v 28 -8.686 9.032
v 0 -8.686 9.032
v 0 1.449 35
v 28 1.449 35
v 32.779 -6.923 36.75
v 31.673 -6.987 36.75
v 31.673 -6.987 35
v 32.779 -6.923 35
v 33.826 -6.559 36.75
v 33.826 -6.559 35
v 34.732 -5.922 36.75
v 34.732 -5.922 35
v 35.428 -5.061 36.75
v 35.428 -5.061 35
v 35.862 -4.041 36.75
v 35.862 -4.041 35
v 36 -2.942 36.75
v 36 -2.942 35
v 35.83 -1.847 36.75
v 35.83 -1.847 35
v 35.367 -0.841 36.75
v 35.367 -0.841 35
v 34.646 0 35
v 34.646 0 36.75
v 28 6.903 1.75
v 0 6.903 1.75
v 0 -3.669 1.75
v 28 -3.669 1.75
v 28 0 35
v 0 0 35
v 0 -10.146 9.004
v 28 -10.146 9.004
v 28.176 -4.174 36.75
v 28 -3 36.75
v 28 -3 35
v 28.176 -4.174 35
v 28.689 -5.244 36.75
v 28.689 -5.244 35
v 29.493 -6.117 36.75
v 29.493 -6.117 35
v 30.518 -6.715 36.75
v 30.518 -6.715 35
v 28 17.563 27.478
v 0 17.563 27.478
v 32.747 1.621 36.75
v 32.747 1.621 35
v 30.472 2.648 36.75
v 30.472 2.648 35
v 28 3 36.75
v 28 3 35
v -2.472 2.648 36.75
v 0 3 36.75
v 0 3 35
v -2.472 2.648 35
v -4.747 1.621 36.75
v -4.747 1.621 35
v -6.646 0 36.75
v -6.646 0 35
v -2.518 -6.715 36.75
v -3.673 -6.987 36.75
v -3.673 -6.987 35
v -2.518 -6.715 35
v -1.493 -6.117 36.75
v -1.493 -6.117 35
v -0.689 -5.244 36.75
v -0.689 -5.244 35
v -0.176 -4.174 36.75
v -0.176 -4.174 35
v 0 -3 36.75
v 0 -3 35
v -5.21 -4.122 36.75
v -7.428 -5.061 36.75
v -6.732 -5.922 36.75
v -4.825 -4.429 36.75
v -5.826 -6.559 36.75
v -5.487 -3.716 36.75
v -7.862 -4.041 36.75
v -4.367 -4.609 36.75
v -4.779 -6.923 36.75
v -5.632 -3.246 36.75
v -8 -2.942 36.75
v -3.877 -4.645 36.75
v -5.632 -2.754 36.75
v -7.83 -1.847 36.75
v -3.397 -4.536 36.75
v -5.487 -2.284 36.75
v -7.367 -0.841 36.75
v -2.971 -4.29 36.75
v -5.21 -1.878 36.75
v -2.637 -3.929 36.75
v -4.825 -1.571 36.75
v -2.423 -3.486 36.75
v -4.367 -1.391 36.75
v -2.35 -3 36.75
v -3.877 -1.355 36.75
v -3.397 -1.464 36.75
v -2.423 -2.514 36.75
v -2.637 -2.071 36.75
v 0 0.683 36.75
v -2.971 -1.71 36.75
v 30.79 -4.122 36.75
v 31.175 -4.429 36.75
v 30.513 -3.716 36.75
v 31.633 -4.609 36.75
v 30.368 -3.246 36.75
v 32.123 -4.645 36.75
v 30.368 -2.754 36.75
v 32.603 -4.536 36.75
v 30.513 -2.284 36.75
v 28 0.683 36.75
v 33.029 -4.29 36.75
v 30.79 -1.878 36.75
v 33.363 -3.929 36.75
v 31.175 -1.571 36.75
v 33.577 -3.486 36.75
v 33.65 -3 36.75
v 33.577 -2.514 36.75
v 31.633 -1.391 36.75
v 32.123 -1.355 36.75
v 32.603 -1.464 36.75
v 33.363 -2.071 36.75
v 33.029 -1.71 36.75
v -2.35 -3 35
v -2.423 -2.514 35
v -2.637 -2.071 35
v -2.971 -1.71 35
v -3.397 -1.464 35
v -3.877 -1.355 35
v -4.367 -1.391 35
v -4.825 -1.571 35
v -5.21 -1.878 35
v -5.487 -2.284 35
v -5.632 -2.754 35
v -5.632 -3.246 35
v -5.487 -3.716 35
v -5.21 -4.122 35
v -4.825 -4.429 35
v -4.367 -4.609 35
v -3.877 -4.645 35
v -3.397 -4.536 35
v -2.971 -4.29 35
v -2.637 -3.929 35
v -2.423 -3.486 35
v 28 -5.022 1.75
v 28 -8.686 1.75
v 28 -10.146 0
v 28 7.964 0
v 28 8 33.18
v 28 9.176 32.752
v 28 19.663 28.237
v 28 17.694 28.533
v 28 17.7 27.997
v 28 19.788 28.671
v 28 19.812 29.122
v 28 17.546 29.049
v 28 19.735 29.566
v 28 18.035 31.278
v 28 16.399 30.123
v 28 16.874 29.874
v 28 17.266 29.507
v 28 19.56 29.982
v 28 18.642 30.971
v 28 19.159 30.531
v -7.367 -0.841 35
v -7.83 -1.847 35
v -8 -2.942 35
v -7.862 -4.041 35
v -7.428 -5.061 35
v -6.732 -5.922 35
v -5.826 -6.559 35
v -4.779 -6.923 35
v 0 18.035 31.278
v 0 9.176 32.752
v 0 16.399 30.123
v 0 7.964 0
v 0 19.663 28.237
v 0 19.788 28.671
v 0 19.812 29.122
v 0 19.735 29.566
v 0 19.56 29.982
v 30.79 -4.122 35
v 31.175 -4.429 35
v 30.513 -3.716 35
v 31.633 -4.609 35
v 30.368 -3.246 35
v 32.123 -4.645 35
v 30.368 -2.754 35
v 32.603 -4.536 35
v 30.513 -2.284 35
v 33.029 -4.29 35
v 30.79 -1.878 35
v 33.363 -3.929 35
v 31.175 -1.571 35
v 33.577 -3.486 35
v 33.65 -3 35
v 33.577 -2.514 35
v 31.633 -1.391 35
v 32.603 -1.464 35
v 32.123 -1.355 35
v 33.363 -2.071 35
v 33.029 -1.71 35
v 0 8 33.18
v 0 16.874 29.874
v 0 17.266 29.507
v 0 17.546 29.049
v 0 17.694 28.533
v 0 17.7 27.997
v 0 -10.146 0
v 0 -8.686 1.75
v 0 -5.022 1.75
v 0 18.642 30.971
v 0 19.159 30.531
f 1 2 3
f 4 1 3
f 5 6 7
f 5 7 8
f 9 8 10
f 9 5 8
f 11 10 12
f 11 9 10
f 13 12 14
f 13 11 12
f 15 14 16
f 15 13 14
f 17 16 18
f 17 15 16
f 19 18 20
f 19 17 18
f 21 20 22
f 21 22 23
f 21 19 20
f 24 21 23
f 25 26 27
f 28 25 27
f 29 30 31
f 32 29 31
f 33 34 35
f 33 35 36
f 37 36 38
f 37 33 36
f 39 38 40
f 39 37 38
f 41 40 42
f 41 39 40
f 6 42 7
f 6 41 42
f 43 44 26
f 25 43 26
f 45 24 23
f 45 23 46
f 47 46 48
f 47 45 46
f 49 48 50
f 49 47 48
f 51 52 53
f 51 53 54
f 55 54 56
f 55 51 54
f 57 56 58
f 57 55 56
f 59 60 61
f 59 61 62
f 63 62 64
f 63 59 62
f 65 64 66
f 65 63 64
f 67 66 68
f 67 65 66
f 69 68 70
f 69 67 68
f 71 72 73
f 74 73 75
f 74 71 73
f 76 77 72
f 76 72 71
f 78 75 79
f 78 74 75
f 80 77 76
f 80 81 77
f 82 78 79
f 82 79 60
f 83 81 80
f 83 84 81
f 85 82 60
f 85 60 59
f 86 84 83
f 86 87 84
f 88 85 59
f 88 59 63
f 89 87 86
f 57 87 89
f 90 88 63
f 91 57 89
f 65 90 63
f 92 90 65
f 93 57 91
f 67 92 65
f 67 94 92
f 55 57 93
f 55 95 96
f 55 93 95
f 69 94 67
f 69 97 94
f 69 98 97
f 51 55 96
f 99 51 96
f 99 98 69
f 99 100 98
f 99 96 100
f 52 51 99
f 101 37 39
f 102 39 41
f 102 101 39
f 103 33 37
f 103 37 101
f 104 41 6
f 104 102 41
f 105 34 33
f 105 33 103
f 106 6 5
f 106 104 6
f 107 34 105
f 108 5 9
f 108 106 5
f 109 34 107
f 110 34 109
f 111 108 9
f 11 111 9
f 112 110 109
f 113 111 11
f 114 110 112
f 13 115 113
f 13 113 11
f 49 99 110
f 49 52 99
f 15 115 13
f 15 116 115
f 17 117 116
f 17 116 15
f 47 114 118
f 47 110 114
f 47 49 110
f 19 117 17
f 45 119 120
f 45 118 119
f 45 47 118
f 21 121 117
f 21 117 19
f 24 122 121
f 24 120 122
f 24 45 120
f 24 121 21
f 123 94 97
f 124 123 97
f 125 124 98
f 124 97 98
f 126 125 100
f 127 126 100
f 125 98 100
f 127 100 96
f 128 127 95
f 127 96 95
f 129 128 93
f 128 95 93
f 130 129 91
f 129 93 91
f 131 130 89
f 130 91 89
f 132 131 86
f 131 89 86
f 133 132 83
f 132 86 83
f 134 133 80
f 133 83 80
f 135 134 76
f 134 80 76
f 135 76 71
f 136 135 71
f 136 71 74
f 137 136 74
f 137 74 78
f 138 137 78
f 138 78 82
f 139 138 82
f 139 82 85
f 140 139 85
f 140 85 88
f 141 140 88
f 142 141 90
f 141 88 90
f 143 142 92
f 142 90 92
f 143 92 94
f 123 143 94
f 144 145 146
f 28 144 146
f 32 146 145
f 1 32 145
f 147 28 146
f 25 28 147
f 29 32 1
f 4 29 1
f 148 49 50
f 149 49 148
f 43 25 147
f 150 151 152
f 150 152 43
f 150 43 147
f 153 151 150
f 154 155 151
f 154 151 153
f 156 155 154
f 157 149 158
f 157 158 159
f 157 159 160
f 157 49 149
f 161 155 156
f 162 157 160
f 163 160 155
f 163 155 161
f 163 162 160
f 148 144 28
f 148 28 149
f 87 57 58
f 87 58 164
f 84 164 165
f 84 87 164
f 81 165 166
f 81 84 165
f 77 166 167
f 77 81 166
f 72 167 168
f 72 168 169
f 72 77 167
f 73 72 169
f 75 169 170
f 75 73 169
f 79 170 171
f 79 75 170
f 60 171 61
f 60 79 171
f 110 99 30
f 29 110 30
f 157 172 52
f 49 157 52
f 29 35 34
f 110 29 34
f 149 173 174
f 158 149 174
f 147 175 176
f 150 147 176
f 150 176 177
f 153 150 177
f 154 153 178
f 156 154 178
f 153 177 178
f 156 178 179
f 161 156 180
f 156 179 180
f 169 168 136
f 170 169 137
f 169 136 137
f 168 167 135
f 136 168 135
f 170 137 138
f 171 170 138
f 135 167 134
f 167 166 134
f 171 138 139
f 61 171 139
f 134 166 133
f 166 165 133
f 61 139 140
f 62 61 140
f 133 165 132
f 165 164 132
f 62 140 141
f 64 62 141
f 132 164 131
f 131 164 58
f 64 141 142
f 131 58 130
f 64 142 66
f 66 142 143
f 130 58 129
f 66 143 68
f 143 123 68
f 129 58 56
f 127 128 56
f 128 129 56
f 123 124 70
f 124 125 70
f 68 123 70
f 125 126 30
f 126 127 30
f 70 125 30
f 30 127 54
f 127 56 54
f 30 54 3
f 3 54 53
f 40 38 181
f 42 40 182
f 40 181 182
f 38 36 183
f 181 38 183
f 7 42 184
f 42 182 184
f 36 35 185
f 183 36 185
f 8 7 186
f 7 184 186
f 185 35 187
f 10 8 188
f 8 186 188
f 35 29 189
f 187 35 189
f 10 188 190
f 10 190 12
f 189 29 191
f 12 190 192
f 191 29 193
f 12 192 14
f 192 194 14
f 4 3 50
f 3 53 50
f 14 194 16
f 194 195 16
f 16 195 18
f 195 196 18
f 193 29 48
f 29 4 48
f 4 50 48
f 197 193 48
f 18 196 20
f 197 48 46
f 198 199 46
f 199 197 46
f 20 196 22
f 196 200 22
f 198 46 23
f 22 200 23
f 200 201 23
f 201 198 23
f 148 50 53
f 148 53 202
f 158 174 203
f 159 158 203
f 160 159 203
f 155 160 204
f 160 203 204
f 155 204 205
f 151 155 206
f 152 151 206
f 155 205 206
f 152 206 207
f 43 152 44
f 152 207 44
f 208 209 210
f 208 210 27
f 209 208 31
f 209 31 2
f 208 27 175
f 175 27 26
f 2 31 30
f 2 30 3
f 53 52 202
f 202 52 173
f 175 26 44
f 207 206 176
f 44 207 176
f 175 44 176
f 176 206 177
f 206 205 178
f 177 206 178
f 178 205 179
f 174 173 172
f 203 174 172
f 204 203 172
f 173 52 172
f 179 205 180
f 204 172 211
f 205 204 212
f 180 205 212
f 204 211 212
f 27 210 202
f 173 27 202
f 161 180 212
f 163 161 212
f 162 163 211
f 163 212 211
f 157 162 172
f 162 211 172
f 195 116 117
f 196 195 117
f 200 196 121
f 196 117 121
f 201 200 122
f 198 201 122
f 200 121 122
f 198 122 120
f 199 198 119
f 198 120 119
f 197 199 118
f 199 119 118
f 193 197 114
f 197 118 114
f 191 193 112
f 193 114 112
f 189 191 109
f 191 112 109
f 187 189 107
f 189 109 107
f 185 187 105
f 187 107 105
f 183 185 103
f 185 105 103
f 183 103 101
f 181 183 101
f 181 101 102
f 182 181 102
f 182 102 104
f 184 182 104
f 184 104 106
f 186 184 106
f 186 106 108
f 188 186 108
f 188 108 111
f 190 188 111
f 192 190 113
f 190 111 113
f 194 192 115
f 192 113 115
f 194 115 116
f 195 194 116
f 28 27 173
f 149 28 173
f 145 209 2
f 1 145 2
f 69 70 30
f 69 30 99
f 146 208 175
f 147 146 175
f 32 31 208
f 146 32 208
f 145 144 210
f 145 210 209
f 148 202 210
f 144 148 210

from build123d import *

# Parameters (mm, degrees)
F1_DEPTH   = 28
F2_R       = 1.65
F3_DEPTH   = 1.75
F1_FACE1_W = 28
F1_FACE1_H = 1.75
F4_REACH   = 50.8712690127


with BuildPart() as f1:
    # F0 (on Right) → F1 (new body)
    with BuildSketch(Plane.YZ):
        with BuildLine():
            Line((-3, 35), (0, 35))
            Line((0, 35), (-10.1456508905, 9.0044083693))
            Line((-10.1456508905, 9.0044083693), (-10.1456508905, 0))
            Line((-10.1456508905, 0), (7.9644151033, 0))
            Line((7.9644151033, 0), (19.6633343933, 28.2374824987))
            ThreePointArc((19.6633343933, 28.2374824987), (19.8121032451, 29.121794497), (19.559512125, 29.9822232317))
            ThreePointArc((19.559512125, 29.9822232317), (18.9135949962, 30.766804474), (18.0350819326, 31.2776777068))
            Line((18.0350819326, 31.2776777068), (3, 36.75))
            Line((3, 36.75), (0, 36.75))
            Line((0, 36.75), (-3, 36.75))
            Line((-3, 36.75), (-3, 35))
        make_face()
        with BuildLine():
            Line((-8.6863745263, 9.0319523177), (1.4485264153, 35))
            Line((1.4485264153, 35), (3, 35))
            Line((3, 35), (8.0000780063, 33.1801204367))
            Line((8.0000780063, 33.1801204367), (9.1758168143, 32.7521865073))
            Line((9.1758168143, 32.7521865073), (16.3991077878, 30.1231235995))
            ThreePointArc((16.3991077878, 30.1231235995), (17.5457217574, 29.0491606036), (17.5627670801, 27.4782278969))
            Line((17.5627670801, 27.4782278969), (6.9034435496, 1.75))
            Line((6.9034435496, 1.75), (-3.6685321031, 1.75))
            Line((-3.6685321031, 1.75), (-5.0215659125, 1.75))
            Line((-5.0215659125, 1.75), (-8.6863745263, 1.75))
            Line((-8.6863745263, 1.75), (-8.6863745263, 9.0319523177))
        make_face(mode=Mode.SUBTRACT)
        Polygon((9.1758168143, 32.7521865073), (8.0000780063, 33.1801204367), (-5.0215659125, 1.75), (-3.6685321031, 1.75), align=None)
    extrude(amount=F1_DEPTH)

    # F2 (on face) → F3 (join)
    with BuildSketch(Plane.XY.offset(36.75)):
        with BuildLine():
            Line((0, -3), (0, 3))
            ThreePointArc((0, 3), (-3.6457513111, 2.215250437), (-6.6457513111, 0))
            ThreePointArc((-6.6457513111, 0), (-7.6807421272, -4.5659302006), (-3.673363624, -6.9866412778))
            ThreePointArc((-3.673363624, -6.9866412778), (-1.0583554341, -5.7104846888), (0, -3))
        make_face()
        with Locations((-4, -3)):
            Circle(F2_R, mode=Mode.SUBTRACT)
        with BuildLine():
            ThreePointArc((34.6457513111, 0), (31.6457513111, 2.215250437), (28, 3))
            Line((28, 3), (28, -3))
            ThreePointArc((28, -3), (29.0583554341, -5.7104846888), (31.673363624, -6.9866412778))
            ThreePointArc((31.673363624, -6.9866412778), (35.6807421272, -4.5659302006), (34.6457513111, 0))
        make_face()
        with Locations((32, -3)):
            Circle(F2_R, mode=Mode.SUBTRACT)
    extrude(amount=-F3_DEPTH)

    f4_end = Plane(origin=(14, -5.0728254453, 22.0022041847), x_dir=(0, -0.3635745105, -0.9315651213), z_dir=(0, -0.9315651213, 0.3635745105))
    # F1_face1 (on face) → F4 (cut, up to a plane its end follows)
    with BuildSketch(Plane(origin=(14, -3, 35.875), x_dir=(1, 0, 0), z_dir=(0, -1, 0))):
        Rectangle(F1_FACE1_W, F1_FACE1_H)
    f4_long = extrude(amount=-F4_REACH, mode=Mode.PRIVATE)
    add(split(f4_long, bisect_by=f4_end, keep=Keep.TOP, mode=Mode.PRIVATE), mode=Mode.SUBTRACT)


solid = f1.part
